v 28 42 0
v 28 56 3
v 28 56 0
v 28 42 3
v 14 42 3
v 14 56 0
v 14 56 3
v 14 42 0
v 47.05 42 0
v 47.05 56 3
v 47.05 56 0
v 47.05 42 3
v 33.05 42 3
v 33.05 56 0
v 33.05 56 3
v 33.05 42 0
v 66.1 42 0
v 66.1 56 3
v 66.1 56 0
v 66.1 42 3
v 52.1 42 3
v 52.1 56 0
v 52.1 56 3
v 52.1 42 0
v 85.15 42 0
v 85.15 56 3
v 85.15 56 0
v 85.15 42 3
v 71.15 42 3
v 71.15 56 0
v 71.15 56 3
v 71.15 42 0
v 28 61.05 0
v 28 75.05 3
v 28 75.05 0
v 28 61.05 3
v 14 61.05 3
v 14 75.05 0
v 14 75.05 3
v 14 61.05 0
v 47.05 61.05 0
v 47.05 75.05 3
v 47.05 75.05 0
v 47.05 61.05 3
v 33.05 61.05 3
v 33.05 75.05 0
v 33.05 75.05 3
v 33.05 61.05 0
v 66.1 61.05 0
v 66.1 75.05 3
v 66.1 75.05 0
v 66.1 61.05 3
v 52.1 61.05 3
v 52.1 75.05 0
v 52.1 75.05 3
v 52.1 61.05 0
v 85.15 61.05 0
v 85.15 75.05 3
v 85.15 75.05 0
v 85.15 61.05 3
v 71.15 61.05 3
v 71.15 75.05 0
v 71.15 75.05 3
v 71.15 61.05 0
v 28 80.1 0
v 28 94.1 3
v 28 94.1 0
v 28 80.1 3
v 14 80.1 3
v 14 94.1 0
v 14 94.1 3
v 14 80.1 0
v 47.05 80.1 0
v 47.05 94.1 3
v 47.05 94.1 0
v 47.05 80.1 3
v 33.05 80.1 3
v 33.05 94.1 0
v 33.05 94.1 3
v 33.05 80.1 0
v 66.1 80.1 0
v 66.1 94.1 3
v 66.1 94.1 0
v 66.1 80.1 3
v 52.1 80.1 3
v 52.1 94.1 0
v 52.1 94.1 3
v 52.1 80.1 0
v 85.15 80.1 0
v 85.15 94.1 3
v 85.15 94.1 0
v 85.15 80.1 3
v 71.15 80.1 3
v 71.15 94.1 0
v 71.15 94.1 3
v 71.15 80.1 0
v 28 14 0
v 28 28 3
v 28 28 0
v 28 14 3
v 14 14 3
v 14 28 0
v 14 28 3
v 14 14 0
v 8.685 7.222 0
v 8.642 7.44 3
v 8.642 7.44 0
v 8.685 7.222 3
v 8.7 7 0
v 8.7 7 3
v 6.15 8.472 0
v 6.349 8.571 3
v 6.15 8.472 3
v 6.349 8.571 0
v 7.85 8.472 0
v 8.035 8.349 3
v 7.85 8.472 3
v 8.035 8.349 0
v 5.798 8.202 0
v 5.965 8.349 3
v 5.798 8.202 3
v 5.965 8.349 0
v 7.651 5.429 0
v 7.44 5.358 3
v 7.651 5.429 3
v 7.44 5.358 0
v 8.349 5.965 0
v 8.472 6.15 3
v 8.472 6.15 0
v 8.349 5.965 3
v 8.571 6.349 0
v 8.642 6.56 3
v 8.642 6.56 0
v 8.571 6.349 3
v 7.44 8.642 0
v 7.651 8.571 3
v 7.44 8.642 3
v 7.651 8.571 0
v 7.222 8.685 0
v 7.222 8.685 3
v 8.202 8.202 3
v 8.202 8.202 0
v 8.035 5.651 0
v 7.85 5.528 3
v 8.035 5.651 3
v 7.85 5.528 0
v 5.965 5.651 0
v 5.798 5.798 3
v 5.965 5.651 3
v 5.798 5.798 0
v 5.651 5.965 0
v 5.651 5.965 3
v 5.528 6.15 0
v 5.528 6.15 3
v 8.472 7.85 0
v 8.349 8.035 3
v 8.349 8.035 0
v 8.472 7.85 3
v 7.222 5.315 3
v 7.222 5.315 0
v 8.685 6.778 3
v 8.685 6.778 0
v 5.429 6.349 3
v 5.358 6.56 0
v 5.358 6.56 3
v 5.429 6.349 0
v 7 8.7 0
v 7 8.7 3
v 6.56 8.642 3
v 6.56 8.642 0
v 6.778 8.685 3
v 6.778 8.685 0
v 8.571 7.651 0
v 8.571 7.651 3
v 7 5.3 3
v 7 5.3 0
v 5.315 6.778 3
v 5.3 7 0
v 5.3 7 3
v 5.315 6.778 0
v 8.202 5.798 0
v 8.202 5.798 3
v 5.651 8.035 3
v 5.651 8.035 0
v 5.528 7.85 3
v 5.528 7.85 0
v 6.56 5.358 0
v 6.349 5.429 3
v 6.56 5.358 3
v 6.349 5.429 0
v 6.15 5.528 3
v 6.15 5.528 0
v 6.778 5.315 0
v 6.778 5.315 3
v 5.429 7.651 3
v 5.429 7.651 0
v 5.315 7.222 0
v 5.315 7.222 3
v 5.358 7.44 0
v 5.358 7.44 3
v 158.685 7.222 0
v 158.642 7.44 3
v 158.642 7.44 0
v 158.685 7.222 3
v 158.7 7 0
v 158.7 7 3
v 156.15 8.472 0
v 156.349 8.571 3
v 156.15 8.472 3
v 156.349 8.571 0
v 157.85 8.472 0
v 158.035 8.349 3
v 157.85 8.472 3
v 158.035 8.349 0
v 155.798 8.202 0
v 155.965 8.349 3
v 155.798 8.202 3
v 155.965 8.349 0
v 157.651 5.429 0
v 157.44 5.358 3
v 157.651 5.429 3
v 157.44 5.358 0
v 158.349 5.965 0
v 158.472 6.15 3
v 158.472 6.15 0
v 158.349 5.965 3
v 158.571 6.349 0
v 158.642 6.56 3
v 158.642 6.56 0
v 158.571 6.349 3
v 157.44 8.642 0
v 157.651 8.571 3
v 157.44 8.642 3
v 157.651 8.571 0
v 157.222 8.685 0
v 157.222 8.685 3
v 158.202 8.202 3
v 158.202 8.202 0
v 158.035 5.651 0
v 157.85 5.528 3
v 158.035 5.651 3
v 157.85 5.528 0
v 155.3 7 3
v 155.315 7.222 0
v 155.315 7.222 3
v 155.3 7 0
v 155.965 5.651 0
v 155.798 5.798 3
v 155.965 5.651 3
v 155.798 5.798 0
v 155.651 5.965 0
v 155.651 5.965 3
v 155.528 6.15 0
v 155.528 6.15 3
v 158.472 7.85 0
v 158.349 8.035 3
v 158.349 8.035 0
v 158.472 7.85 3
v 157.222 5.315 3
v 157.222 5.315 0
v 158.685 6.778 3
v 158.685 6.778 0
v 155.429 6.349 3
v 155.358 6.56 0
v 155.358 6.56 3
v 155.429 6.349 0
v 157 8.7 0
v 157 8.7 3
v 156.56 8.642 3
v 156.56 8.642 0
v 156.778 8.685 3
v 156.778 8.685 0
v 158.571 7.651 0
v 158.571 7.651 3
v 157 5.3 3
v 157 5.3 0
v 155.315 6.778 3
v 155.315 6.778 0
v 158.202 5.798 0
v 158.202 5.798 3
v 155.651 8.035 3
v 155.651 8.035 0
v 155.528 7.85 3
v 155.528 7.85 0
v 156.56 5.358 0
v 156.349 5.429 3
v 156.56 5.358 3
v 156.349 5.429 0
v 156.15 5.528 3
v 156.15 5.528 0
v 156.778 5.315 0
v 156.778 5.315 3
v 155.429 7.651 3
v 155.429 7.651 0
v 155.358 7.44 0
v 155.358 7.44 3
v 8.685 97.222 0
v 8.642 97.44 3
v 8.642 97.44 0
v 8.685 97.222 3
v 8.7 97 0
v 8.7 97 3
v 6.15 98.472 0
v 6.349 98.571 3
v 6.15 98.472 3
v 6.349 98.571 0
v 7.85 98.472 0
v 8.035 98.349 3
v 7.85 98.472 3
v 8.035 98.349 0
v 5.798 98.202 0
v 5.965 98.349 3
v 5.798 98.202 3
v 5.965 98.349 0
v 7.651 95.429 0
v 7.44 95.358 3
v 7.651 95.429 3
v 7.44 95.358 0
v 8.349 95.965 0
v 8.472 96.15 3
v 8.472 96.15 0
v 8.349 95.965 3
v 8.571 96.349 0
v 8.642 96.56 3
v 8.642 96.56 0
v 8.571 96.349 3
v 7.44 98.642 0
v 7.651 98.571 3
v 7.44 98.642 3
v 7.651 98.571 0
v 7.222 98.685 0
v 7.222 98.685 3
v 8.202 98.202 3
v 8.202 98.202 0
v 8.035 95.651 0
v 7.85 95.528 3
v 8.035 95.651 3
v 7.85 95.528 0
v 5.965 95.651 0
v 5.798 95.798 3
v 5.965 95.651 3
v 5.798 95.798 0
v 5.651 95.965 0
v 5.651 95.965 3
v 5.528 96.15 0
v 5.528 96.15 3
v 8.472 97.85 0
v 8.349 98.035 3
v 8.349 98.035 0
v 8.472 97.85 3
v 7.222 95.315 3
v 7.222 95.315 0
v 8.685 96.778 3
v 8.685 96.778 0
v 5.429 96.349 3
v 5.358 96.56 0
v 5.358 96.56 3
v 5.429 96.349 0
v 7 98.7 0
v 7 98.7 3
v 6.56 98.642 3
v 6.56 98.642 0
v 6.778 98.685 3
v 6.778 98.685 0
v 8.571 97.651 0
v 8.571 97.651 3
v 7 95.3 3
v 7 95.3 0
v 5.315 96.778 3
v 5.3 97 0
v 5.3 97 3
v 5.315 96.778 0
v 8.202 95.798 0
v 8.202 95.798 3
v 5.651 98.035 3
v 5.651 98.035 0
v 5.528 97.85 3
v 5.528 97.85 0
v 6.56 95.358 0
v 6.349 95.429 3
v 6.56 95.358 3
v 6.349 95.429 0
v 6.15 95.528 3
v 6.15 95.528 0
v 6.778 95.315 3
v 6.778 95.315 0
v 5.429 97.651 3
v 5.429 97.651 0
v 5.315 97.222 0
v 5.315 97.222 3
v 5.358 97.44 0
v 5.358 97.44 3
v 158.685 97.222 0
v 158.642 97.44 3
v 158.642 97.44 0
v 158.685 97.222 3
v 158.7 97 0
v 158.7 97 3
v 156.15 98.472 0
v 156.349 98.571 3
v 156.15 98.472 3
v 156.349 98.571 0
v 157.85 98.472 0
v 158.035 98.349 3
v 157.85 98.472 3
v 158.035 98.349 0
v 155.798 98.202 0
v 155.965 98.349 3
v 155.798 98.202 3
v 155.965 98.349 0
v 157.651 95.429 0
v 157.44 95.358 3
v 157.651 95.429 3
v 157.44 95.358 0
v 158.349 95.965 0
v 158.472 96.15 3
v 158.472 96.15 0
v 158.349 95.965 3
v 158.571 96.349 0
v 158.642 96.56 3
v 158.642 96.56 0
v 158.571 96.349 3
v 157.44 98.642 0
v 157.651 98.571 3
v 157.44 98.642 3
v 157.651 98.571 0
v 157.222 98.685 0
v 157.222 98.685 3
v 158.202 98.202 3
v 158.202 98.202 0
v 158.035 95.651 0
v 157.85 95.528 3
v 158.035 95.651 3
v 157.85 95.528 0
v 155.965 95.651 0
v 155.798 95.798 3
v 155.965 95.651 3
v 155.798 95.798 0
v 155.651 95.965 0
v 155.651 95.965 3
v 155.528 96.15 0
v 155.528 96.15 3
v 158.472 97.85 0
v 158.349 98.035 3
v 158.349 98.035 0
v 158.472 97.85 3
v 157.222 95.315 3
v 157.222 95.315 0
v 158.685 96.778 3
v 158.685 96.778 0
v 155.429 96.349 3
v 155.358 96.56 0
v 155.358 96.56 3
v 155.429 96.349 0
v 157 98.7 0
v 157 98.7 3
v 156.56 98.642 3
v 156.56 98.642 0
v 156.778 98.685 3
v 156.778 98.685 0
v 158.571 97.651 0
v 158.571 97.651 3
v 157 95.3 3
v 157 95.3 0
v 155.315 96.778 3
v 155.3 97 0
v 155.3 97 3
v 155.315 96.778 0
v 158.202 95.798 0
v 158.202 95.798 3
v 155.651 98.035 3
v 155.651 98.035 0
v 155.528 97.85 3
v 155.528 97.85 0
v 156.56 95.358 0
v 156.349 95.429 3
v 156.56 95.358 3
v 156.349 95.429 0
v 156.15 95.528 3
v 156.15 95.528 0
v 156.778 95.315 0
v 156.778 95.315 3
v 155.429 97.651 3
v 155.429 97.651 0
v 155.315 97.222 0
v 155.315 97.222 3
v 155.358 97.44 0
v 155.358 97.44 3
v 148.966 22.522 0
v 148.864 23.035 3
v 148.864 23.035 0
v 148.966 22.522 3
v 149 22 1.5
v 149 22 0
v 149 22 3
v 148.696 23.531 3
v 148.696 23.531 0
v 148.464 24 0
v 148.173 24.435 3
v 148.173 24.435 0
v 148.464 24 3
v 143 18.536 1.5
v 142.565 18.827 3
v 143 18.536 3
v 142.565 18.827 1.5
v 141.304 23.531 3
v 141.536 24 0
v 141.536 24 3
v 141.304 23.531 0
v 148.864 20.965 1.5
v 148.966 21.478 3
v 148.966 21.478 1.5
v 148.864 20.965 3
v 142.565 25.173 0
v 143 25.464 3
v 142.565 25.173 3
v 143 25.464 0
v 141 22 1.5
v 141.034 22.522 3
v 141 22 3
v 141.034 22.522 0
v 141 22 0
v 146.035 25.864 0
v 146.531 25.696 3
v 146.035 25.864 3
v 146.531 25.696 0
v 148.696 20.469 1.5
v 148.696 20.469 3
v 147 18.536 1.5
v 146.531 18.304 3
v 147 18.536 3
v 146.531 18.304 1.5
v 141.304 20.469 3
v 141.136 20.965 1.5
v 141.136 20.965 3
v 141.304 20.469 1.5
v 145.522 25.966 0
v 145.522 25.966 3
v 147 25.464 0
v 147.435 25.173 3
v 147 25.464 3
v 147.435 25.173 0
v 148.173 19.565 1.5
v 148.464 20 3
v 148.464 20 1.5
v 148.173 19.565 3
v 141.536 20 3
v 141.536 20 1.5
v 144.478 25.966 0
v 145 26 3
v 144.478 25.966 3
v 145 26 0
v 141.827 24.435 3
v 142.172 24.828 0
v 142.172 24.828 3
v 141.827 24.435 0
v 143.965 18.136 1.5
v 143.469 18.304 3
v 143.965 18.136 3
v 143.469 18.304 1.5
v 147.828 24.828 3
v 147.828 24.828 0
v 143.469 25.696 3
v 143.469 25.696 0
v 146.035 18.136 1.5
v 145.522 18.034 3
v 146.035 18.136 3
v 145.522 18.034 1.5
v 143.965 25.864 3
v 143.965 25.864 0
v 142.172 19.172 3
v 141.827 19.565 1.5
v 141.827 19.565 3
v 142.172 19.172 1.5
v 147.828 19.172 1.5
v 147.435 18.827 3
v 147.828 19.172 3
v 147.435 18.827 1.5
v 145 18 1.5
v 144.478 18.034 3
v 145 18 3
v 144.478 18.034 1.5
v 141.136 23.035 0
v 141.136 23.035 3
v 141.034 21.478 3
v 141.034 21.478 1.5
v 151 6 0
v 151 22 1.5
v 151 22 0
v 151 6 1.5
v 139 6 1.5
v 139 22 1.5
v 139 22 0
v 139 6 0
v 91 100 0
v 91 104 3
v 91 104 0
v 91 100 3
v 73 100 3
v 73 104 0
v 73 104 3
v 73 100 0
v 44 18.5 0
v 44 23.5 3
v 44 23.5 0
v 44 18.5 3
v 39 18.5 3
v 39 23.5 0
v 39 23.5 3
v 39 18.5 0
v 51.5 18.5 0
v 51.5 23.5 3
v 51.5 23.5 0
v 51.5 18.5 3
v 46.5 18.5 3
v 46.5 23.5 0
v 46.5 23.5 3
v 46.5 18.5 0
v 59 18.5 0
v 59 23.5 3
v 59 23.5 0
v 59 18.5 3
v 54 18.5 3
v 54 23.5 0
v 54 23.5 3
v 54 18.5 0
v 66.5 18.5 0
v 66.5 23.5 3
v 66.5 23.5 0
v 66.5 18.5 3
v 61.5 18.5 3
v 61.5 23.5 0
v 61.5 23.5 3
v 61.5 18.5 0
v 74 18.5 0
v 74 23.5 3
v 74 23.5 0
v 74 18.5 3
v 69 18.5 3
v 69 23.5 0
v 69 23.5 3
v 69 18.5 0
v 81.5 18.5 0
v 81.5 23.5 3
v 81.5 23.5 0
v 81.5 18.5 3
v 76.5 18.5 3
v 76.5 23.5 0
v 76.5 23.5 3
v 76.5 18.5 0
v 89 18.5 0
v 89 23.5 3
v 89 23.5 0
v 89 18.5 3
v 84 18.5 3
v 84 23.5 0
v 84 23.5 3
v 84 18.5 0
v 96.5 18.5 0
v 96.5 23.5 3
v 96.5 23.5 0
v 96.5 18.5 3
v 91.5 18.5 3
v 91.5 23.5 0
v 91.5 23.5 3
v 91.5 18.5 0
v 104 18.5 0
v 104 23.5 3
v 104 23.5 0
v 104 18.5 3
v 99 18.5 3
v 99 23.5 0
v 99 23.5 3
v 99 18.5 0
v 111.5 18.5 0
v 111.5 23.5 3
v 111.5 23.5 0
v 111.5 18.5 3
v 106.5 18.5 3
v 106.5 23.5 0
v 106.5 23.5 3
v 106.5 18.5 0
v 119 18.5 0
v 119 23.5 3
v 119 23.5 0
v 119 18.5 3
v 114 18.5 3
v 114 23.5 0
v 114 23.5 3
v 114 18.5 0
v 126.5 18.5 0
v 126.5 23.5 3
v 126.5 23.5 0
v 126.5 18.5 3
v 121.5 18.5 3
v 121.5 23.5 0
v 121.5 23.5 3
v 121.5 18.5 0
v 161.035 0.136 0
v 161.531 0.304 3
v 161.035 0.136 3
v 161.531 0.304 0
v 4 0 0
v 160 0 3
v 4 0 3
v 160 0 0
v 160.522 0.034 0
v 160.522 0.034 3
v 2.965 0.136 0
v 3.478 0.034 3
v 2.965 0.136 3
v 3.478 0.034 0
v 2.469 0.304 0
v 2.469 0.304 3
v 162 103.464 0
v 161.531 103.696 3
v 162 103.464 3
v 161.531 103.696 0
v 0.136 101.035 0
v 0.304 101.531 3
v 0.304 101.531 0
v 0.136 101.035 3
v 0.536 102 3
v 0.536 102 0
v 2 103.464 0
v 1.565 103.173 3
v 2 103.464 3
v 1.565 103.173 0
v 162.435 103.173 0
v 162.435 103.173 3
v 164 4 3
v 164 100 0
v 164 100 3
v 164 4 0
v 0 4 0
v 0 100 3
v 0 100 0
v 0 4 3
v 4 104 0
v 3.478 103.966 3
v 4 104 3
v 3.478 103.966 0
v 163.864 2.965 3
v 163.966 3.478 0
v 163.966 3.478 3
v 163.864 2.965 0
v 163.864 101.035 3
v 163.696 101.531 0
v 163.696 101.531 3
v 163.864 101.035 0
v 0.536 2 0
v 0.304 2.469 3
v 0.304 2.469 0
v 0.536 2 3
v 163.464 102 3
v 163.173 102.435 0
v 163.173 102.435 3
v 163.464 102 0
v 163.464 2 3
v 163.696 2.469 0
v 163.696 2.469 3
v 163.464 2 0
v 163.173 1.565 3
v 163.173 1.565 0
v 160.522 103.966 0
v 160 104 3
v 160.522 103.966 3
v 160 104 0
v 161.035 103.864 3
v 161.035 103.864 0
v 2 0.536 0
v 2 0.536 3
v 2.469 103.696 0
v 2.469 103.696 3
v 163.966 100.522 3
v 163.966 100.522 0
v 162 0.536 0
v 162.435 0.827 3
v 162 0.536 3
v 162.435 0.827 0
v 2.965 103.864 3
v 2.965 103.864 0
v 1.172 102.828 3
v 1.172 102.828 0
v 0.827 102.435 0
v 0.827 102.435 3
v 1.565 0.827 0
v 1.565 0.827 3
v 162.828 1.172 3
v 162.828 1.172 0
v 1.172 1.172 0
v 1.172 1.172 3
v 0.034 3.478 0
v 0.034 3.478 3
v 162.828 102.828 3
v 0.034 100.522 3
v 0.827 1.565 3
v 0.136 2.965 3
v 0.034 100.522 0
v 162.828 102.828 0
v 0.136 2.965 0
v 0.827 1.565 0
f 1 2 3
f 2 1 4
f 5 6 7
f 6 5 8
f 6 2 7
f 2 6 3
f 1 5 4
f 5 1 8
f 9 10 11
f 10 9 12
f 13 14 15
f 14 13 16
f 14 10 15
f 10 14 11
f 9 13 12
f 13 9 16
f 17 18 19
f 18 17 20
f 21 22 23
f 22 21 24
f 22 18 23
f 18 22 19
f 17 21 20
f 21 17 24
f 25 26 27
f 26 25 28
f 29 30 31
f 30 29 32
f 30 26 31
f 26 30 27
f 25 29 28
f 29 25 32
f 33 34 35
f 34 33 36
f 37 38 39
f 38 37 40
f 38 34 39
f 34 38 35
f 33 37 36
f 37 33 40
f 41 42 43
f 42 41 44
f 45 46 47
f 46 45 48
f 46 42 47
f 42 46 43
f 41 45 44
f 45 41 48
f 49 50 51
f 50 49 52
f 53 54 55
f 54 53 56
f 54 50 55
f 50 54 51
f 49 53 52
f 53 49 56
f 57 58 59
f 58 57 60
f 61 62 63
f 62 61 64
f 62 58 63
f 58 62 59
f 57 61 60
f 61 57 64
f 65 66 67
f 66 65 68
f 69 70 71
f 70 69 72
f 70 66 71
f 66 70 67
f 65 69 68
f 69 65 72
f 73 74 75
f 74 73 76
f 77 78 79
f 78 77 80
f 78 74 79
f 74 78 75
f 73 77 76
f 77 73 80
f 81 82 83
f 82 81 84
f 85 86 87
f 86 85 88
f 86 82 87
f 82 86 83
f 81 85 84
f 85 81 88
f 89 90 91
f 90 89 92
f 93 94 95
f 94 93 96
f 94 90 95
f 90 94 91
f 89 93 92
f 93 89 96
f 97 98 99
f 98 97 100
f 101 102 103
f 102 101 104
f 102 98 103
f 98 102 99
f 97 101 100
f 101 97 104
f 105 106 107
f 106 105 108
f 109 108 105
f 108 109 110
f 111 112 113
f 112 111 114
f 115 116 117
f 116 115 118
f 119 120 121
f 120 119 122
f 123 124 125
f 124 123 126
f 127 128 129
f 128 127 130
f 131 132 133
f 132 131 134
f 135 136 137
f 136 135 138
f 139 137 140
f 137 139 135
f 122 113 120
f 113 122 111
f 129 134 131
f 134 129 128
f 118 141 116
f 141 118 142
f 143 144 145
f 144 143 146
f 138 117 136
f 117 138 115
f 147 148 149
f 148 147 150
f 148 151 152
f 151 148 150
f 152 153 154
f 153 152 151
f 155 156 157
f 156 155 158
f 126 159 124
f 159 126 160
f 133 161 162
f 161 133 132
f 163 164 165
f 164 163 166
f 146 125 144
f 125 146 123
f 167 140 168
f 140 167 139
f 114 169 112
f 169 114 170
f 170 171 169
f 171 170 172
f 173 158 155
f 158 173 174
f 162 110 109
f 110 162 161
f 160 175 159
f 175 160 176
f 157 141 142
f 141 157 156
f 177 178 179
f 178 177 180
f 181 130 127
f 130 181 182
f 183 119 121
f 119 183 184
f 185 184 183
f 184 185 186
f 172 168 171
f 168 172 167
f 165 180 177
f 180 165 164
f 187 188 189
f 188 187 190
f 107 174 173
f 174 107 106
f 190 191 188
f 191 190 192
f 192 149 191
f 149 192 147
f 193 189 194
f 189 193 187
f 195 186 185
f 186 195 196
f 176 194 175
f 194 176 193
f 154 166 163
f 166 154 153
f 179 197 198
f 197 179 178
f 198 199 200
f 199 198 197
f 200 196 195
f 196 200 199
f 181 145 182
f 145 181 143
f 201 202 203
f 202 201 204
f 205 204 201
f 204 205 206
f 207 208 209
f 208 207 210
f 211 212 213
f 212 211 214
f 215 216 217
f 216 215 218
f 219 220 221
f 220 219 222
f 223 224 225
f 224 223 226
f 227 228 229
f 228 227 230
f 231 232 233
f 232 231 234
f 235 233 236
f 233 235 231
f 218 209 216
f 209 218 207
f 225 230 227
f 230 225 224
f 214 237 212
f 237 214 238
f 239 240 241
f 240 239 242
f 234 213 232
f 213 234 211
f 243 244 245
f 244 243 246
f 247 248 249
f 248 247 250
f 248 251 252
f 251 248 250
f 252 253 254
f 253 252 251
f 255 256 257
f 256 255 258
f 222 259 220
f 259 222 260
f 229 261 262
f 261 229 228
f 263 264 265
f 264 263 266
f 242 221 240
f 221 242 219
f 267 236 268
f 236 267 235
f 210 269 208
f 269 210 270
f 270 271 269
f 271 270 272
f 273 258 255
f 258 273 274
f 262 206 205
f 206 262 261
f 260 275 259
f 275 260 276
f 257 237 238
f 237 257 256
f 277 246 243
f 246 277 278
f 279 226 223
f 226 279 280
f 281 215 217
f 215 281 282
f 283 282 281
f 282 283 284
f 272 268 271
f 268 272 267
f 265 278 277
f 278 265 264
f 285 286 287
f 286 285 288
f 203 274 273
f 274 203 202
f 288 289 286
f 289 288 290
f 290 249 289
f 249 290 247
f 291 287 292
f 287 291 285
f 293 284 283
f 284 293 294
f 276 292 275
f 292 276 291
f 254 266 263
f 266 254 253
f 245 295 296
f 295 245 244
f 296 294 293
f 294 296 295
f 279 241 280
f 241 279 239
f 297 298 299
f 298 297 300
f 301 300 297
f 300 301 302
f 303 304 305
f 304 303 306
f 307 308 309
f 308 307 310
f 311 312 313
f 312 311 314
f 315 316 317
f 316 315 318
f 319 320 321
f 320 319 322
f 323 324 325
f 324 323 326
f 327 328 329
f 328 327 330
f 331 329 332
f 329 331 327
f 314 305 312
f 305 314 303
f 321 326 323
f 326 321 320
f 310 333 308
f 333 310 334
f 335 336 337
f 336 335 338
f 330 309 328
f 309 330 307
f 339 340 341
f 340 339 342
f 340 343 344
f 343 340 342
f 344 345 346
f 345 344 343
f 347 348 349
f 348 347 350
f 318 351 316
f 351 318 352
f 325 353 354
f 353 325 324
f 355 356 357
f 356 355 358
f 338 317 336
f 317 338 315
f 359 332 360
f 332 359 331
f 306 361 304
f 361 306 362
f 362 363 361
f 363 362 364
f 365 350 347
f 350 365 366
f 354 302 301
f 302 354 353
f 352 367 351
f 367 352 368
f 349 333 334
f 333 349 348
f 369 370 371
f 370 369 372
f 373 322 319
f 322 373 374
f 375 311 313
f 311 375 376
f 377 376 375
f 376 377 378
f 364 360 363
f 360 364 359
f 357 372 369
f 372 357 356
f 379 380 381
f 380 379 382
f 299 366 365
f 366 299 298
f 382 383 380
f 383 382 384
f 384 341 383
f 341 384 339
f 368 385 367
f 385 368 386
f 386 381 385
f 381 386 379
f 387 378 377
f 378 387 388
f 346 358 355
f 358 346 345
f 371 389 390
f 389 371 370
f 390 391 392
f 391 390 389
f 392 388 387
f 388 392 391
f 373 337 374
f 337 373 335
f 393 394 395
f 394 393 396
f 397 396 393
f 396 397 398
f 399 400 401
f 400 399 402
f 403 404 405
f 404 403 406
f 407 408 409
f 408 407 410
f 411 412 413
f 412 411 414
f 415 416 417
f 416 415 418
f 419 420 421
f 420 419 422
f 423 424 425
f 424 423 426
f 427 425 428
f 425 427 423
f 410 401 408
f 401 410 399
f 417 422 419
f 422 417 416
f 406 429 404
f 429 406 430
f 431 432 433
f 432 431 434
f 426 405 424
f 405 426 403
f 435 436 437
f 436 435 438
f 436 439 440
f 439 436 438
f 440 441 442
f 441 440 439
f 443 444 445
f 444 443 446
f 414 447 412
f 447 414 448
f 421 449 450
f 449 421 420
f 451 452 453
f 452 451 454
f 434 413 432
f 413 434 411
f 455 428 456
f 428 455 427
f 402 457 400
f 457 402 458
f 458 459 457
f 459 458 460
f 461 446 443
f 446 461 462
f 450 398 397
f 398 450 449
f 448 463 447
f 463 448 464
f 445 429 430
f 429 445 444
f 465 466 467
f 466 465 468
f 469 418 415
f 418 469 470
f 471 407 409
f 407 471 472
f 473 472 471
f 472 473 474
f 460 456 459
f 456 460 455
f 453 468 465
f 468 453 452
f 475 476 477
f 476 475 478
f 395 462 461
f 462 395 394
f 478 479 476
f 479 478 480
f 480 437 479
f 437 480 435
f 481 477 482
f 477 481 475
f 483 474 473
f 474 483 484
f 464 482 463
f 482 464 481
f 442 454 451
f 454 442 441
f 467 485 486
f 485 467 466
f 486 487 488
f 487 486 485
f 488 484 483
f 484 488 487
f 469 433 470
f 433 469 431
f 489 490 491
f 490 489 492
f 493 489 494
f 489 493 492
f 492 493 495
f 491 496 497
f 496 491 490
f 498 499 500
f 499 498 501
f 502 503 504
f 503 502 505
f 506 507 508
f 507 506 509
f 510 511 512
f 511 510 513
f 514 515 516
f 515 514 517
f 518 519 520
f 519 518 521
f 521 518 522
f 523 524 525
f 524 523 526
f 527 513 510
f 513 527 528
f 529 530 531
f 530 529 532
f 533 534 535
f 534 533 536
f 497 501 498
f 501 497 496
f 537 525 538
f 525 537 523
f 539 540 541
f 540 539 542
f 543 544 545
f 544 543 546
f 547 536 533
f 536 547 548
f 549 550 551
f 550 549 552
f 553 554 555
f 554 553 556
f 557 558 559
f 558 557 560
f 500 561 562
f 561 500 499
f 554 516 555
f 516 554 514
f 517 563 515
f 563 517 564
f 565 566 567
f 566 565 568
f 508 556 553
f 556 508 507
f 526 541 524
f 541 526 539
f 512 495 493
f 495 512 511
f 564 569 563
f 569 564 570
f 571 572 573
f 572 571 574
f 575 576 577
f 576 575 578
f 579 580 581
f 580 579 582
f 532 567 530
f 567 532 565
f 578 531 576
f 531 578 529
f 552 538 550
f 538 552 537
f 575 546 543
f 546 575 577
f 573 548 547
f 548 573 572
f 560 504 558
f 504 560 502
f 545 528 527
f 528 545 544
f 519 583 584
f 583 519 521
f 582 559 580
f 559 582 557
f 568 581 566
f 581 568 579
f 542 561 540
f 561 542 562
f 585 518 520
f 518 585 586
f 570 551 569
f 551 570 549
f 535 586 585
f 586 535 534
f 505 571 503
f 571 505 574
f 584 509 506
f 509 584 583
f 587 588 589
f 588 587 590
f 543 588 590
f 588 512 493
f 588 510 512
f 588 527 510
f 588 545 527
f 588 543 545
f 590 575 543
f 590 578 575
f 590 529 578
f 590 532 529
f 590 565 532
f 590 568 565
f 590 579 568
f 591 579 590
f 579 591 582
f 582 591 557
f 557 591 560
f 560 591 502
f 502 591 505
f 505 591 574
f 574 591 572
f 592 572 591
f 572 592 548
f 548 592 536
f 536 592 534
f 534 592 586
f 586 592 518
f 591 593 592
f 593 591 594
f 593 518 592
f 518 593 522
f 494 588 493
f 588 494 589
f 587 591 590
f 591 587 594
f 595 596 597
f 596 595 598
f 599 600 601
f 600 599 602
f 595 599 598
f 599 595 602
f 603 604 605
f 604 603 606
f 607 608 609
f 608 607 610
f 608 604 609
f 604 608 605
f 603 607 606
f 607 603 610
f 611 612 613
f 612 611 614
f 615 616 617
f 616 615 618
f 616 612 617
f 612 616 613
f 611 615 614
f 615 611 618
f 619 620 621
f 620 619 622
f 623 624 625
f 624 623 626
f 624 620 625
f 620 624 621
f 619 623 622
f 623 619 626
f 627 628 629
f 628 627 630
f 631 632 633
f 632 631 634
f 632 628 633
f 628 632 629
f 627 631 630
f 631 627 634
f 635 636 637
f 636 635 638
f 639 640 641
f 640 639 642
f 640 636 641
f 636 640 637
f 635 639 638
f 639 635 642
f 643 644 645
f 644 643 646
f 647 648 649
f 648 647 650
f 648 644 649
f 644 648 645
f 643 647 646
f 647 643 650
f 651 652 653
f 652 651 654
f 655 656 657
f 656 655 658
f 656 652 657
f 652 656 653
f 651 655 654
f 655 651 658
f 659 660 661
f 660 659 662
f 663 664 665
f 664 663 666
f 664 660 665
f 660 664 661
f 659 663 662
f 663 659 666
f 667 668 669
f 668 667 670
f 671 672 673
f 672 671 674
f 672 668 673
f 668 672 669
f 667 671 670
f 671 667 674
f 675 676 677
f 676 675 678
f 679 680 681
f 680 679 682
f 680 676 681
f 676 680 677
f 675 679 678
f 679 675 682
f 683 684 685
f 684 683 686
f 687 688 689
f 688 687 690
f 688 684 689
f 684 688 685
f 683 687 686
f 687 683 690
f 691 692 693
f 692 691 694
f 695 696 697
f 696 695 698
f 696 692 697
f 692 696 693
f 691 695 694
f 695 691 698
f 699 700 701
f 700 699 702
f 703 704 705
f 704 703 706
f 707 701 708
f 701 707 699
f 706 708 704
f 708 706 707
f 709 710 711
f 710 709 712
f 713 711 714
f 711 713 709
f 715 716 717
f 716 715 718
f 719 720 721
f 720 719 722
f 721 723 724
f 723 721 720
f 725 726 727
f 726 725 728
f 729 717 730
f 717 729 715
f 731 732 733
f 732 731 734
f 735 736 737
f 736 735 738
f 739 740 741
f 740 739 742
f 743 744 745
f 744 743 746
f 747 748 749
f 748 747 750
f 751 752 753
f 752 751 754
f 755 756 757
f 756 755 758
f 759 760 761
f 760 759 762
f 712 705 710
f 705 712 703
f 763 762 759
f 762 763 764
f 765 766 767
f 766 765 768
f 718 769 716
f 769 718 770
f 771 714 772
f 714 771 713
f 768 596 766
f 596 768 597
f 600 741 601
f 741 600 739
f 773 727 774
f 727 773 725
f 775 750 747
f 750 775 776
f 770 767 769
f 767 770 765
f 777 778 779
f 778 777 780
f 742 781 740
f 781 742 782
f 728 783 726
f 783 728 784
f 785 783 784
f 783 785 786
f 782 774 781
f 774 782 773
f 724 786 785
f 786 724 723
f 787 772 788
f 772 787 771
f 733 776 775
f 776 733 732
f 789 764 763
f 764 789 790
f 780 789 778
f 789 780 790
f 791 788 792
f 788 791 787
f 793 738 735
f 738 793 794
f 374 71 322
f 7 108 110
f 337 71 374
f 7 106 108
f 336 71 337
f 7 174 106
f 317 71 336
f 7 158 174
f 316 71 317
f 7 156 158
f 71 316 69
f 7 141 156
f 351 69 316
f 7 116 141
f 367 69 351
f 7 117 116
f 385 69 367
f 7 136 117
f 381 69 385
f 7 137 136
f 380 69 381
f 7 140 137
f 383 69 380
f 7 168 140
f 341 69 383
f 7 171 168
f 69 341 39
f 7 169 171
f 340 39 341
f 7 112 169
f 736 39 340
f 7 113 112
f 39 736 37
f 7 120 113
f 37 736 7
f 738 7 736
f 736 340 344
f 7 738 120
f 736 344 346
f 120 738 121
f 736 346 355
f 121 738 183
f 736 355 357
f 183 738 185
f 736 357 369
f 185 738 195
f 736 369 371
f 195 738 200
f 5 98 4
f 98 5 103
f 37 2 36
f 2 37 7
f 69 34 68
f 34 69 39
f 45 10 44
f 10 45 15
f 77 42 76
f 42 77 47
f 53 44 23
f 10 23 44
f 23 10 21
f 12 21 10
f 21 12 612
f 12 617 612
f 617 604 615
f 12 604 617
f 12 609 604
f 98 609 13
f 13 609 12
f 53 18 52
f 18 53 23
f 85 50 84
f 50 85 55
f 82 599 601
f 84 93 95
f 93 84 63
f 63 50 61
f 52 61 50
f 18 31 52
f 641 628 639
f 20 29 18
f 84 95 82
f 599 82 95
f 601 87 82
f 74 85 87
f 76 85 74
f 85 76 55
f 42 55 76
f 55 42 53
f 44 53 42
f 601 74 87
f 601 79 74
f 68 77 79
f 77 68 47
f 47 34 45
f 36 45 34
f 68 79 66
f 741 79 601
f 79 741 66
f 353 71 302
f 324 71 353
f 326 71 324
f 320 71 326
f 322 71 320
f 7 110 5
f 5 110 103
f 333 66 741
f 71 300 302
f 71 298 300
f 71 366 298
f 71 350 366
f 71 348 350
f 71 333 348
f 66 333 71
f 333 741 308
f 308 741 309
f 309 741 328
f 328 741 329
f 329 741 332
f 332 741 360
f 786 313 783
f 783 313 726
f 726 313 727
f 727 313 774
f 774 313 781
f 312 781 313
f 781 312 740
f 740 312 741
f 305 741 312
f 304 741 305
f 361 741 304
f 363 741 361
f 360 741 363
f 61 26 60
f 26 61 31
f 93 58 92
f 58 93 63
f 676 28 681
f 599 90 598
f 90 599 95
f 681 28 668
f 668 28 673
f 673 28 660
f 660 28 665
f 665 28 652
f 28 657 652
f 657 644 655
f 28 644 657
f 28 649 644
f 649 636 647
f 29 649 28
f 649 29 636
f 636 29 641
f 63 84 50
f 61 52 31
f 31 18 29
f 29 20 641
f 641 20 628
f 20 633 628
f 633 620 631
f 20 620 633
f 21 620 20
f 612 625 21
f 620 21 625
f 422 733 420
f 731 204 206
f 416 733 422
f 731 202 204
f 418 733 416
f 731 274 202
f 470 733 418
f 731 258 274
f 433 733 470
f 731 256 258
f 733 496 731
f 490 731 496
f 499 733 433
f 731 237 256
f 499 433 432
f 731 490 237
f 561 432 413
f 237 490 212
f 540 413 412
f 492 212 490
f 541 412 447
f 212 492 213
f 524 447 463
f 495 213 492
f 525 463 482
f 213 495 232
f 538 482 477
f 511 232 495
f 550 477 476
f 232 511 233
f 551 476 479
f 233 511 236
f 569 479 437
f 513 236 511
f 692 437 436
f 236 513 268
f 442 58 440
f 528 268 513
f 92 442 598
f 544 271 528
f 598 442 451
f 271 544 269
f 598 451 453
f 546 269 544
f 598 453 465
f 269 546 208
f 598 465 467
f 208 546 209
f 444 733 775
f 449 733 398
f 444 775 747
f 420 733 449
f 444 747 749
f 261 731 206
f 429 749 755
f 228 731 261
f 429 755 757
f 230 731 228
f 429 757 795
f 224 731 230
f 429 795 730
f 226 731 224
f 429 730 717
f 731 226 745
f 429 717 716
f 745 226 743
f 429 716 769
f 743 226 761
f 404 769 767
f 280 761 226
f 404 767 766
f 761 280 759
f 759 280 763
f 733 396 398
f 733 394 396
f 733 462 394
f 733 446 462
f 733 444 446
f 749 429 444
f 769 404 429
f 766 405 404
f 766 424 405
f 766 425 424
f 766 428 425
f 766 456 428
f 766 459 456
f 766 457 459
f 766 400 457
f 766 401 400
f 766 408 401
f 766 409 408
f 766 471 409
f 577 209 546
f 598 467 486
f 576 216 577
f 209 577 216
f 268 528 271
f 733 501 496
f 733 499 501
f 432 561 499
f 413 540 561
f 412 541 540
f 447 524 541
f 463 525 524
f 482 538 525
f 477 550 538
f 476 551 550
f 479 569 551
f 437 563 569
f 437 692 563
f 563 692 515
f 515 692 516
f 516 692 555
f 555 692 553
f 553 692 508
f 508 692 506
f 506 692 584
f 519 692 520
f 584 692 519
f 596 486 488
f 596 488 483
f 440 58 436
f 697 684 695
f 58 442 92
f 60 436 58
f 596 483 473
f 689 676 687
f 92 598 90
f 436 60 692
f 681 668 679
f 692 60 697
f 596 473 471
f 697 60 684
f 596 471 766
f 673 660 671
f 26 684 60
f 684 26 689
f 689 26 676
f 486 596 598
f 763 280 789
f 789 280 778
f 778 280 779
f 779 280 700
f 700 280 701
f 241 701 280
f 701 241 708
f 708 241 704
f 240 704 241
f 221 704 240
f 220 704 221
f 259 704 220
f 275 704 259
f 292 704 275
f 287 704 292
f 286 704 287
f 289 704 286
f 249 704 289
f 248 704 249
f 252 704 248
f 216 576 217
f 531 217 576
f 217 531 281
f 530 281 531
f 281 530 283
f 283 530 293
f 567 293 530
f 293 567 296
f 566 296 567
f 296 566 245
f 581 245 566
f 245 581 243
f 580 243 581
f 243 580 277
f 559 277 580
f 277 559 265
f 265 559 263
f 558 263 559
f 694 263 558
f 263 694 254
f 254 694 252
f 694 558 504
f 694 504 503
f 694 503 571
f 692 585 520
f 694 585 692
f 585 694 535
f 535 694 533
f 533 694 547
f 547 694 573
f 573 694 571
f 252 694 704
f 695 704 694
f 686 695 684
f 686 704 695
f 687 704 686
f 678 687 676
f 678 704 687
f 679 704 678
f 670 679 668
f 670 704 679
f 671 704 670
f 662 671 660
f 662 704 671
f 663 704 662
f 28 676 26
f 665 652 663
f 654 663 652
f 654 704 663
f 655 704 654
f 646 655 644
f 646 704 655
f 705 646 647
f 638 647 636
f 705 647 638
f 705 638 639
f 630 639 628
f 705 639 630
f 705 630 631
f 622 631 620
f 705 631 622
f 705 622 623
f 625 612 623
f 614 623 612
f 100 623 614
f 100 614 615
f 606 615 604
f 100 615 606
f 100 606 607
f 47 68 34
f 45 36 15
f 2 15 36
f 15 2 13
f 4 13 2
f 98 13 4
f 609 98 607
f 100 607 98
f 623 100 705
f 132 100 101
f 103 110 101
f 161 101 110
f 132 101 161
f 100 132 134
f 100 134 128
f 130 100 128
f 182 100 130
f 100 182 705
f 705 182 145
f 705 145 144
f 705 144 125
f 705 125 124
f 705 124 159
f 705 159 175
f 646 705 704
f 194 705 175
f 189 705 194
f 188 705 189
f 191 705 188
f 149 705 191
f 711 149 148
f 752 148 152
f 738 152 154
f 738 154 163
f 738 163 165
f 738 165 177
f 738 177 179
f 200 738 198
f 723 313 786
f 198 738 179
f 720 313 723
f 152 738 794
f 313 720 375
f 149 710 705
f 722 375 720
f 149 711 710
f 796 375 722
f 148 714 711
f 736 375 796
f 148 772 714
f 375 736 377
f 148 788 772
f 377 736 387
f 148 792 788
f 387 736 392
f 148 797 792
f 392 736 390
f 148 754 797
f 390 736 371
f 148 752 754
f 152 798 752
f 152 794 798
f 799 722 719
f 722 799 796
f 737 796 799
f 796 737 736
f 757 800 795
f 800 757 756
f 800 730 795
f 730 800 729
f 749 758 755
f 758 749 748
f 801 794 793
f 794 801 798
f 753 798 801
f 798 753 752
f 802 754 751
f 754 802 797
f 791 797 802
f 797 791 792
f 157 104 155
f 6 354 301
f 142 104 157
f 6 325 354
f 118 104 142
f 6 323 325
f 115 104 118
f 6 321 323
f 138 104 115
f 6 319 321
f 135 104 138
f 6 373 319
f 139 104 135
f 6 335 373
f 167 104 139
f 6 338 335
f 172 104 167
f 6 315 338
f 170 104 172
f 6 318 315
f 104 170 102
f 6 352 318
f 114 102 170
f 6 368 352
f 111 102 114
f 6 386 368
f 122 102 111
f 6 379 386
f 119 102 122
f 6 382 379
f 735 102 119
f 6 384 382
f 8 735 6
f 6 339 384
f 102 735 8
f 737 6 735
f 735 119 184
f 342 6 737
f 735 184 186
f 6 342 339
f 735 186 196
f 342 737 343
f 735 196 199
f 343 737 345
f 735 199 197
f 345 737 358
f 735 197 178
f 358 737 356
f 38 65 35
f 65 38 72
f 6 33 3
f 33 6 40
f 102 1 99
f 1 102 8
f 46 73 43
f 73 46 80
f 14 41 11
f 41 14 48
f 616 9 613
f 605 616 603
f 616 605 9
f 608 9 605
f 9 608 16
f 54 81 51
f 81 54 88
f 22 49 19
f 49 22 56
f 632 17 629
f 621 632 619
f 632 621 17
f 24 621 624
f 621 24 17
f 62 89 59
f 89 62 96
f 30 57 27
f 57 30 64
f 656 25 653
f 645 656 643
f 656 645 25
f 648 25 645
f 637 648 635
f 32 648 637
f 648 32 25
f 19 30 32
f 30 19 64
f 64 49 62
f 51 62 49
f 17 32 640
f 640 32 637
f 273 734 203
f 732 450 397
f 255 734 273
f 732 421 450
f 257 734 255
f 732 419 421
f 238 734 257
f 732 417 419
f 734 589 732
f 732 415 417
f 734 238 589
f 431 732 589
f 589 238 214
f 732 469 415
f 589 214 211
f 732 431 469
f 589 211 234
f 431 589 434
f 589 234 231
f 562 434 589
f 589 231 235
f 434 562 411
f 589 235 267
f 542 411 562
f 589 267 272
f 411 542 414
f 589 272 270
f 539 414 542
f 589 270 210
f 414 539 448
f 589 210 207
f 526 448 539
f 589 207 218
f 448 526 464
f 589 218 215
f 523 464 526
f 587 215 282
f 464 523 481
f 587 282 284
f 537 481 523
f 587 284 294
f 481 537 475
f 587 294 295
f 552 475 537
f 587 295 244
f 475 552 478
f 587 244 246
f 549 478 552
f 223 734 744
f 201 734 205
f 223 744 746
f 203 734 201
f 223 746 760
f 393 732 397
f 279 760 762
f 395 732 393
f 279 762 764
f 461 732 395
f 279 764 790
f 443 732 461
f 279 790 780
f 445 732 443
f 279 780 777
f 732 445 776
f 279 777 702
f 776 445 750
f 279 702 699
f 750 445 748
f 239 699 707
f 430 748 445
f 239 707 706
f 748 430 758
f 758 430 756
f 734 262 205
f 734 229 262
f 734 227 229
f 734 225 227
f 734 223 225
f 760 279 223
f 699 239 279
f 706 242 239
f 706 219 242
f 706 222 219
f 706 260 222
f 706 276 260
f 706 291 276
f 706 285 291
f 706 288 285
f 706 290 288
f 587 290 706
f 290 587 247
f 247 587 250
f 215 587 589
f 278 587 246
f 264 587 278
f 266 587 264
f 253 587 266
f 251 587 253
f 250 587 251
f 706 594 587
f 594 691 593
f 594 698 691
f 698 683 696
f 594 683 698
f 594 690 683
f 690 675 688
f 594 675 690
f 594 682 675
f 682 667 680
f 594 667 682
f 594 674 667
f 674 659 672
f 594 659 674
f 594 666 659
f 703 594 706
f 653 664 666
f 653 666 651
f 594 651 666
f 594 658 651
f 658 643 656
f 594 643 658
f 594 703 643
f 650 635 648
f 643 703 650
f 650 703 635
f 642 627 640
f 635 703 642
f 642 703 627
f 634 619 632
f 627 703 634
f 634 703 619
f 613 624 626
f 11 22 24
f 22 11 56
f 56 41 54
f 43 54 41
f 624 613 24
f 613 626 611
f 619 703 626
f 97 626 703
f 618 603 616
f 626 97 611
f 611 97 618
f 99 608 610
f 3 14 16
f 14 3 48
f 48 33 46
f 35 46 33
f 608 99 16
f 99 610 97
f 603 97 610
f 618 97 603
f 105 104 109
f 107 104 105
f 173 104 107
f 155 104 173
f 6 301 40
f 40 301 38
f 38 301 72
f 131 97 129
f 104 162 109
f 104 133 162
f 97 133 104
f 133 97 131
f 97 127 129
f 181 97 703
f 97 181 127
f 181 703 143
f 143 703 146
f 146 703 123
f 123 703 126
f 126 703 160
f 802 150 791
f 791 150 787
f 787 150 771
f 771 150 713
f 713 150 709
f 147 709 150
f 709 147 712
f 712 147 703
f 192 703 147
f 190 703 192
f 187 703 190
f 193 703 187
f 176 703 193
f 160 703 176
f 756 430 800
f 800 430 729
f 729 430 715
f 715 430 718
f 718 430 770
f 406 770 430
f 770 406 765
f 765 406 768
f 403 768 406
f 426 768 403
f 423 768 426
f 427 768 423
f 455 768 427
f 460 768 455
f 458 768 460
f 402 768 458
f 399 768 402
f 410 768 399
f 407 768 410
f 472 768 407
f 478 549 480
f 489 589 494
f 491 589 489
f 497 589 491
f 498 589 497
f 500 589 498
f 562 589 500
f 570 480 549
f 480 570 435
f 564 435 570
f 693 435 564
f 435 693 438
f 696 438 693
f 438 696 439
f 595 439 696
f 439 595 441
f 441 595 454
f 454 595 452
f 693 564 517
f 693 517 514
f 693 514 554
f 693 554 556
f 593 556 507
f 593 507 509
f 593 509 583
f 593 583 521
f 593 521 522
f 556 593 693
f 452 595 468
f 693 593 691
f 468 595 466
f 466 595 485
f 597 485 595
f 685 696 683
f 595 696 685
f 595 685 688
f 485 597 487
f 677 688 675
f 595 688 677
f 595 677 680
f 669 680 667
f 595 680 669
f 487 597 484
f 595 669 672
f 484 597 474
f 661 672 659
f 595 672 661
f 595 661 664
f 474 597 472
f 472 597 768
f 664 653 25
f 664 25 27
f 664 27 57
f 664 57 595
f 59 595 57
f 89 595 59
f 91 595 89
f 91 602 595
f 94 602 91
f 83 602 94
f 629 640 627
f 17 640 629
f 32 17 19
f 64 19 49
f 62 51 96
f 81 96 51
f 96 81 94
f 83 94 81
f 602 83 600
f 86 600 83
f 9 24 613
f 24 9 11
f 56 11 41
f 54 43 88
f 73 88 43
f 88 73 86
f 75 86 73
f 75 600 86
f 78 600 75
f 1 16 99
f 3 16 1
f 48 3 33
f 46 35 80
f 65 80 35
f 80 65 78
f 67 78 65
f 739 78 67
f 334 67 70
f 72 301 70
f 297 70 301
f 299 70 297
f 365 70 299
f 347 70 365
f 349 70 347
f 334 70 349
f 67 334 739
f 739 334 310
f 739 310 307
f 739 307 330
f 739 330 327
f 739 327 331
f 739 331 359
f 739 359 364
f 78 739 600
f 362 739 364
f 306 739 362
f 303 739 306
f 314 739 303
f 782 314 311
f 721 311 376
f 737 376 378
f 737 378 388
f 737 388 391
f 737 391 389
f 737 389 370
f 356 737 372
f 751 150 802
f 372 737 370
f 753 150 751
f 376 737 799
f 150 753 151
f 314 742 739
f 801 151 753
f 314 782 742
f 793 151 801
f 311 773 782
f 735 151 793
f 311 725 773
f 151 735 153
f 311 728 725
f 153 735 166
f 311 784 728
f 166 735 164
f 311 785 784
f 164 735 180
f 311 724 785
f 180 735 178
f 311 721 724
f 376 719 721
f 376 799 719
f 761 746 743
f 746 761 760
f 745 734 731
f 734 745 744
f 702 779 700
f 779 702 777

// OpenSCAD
// 13keyAgentTools Rev 0.4
// Parametric enclosure for a hand-wired Arduino Micro multi-agent macro keyboard.
// Export one part at a time by changing `part`.

part = "plate"; // plate / bottom / assembly / tolerance / pixel_carrier

$fn = 48;

case_w = 164;
case_d = 104;
plate_t = 3.0;
bottom_h = 18.0;
bottom_t = 3.0;
wall = 3.0;
corner_r = 4.0;

key_pitch = 19.05;
key_hole = 14.0;
// One EC11 encoder, reserved for future system-volume control.
volume_encoder = [145, 22];

// Twelve individually addressable RGB pixels on the top panel.
quota_led_count = 12;
quota_led_start_x = 39;
quota_led_pitch = 7.5;
quota_led_window_w = 5;
quota_led_window_d = 5;
quota_led_center_y = 21;

// Twelve keys occupy a compact 4 x 3 grid; the thirteenth key sits in the top row.
key_positions = [
    [0, 0], [1, 0], [2, 0], [3, 0],
    [0, 1], [1, 1], [2, 1], [3, 1],
    [0, 2], [1, 2], [2, 2], [3, 2]
];
key_origin = [14, 42];
top_key_origin = [14, 14];

screw_positions = [
    [7, 7],
    [case_w - 7, 7],
    [7, case_d - 7],
    [case_w - 7, case_d - 7]
];

module rounded_prism(w, d, h, r) {
    linear_extrude(height = h)
        offset(r = r)
            offset(delta = -r)
                square([w, d], center = false);
}

module key_holes(extra = 1) {
    for (p = key_positions) {
        translate([
            key_origin[0] + p[0] * key_pitch,
            key_origin[1] + p[1] * key_pitch,
            -extra
        ])
            cube([key_hole, key_hole, plate_t + 2 * extra], center = false);
    }
    translate([top_key_origin[0], top_key_origin[1], -extra])
        cube([key_hole, key_hole, plate_t + 2 * extra], center = false);
}

module screw_holes(extra = 1) {
    for (p = screw_positions) {
        translate([p[0], p[1], -extra])
            cylinder(d = 3.4, h = plate_t + bottom_h + 2 * extra);
    }
}

module control_holes(extra = 1) {
    // Dedicated volume EC11 shaft and anti-rotation clearance.
    translate([volume_encoder[0], volume_encoder[1], -extra])
        cylinder(d = 8.0, h = plate_t + 2 * extra);
    translate([volume_encoder[0], volume_encoder[1] - 8, -extra])
        cube([12, 16, plate_t + 2 * extra], center = true);

    // Rear USB opening. This is intentionally oversized for cable tolerance.
    translate([case_w / 2 - 9, case_d - 4, -extra])
        cube([18, 8, 9], center = false);
}

module quota_windows(extra = 1) {
    // Individual top-panel windows keep each RGB pixel visually separated.
    for (i = [0 : quota_led_count - 1]) {
        translate([
            quota_led_start_x + i * quota_led_pitch,
            quota_led_center_y - quota_led_window_d / 2,
            -extra
        ])
            cube([
                quota_led_window_w,
                quota_led_window_d,
                plate_t + 2 * extra
            ], center = false);
    }
}

module plate() {
    difference() {
        rounded_prism(case_w, case_d, plate_t, corner_r);
        key_holes();
        screw_holes();
        control_holes();
        quota_windows();
    }
}

module bottom() {
    difference() {
        rounded_prism(case_w, case_d, bottom_h, corner_r);

        // Main cavity. Keep a solid bottom and a perimeter wall.
        translate([wall, wall, bottom_t])
            cube([
                case_w - 2 * wall,
                case_d - 2 * wall,
                bottom_h
            ], center = false);

        // Through holes for M3 hardware.
        for (p = screw_positions) {
            translate([p[0], p[1], -1])
                cylinder(d = 3.4, h = bottom_h + 2);
        }

        // Rear cable relief.
        translate([case_w / 2 - 10, case_d - 5, 4])
            cube([20, 8, 10], center = false);

    }
}

module pixel_carrier() {
    // Thin carrier for 12 individually wired 5 mm-class RGB pixels.
    carrier_w = (quota_led_count - 1) * quota_led_pitch + quota_led_window_w + 4;
    carrier_d = 8;
    carrier_t = 2;
    carrier_x = quota_led_start_x - 2;
    carrier_y = quota_led_center_y - carrier_d / 2;
    difference() {
        translate([carrier_x, carrier_y, 0])
            rounded_prism(carrier_w, carrier_d, carrier_t, 1.5);
        for (i = [0 : quota_led_count - 1]) {
            translate([
                quota_led_start_x + i * quota_led_pitch + quota_led_window_w / 2 - 2.8,
                quota_led_center_y - 2.8,
                -1
            ])
                cube([5.6, 5.6, carrier_t + 2], center = false);
        }
    }
}

module tolerance_coupon() {
    coupon_w = 70;
    coupon_d = 42;
    difference() {
        rounded_prism(coupon_w, coupon_d, 4, 2);

        // Four switch-hole variants: 13.8, 14.0, 14.2, 14.4 mm.
        for (i = [0 : 3]) {
            translate([9 + i * 17, 21, -1])
                cube([13.8 + i * 0.2, 13.8 + i * 0.2, 6], center = true);
        }

        // M3 insert-hole variants.
        for (i = [0 : 2]) {
            translate([12 + i * 18, 8, -1])
                cylinder(d = 4.0 + i * 0.2, h = 6);
        }
    }
}

module assembly() {
    color("#d8d8d8")
        translate([0, 0, bottom_h])
            plate();
    color("#666666")
        bottom();
}

if (part == "plate") {
    plate();
} else if (part == "bottom") {
    bottom();
} else if (part == "assembly") {
    assembly();
} else if (part == "tolerance") {
    tolerance_coupon();
} else if (part == "pixel_carrier") {
    pixel_carrier();
}
